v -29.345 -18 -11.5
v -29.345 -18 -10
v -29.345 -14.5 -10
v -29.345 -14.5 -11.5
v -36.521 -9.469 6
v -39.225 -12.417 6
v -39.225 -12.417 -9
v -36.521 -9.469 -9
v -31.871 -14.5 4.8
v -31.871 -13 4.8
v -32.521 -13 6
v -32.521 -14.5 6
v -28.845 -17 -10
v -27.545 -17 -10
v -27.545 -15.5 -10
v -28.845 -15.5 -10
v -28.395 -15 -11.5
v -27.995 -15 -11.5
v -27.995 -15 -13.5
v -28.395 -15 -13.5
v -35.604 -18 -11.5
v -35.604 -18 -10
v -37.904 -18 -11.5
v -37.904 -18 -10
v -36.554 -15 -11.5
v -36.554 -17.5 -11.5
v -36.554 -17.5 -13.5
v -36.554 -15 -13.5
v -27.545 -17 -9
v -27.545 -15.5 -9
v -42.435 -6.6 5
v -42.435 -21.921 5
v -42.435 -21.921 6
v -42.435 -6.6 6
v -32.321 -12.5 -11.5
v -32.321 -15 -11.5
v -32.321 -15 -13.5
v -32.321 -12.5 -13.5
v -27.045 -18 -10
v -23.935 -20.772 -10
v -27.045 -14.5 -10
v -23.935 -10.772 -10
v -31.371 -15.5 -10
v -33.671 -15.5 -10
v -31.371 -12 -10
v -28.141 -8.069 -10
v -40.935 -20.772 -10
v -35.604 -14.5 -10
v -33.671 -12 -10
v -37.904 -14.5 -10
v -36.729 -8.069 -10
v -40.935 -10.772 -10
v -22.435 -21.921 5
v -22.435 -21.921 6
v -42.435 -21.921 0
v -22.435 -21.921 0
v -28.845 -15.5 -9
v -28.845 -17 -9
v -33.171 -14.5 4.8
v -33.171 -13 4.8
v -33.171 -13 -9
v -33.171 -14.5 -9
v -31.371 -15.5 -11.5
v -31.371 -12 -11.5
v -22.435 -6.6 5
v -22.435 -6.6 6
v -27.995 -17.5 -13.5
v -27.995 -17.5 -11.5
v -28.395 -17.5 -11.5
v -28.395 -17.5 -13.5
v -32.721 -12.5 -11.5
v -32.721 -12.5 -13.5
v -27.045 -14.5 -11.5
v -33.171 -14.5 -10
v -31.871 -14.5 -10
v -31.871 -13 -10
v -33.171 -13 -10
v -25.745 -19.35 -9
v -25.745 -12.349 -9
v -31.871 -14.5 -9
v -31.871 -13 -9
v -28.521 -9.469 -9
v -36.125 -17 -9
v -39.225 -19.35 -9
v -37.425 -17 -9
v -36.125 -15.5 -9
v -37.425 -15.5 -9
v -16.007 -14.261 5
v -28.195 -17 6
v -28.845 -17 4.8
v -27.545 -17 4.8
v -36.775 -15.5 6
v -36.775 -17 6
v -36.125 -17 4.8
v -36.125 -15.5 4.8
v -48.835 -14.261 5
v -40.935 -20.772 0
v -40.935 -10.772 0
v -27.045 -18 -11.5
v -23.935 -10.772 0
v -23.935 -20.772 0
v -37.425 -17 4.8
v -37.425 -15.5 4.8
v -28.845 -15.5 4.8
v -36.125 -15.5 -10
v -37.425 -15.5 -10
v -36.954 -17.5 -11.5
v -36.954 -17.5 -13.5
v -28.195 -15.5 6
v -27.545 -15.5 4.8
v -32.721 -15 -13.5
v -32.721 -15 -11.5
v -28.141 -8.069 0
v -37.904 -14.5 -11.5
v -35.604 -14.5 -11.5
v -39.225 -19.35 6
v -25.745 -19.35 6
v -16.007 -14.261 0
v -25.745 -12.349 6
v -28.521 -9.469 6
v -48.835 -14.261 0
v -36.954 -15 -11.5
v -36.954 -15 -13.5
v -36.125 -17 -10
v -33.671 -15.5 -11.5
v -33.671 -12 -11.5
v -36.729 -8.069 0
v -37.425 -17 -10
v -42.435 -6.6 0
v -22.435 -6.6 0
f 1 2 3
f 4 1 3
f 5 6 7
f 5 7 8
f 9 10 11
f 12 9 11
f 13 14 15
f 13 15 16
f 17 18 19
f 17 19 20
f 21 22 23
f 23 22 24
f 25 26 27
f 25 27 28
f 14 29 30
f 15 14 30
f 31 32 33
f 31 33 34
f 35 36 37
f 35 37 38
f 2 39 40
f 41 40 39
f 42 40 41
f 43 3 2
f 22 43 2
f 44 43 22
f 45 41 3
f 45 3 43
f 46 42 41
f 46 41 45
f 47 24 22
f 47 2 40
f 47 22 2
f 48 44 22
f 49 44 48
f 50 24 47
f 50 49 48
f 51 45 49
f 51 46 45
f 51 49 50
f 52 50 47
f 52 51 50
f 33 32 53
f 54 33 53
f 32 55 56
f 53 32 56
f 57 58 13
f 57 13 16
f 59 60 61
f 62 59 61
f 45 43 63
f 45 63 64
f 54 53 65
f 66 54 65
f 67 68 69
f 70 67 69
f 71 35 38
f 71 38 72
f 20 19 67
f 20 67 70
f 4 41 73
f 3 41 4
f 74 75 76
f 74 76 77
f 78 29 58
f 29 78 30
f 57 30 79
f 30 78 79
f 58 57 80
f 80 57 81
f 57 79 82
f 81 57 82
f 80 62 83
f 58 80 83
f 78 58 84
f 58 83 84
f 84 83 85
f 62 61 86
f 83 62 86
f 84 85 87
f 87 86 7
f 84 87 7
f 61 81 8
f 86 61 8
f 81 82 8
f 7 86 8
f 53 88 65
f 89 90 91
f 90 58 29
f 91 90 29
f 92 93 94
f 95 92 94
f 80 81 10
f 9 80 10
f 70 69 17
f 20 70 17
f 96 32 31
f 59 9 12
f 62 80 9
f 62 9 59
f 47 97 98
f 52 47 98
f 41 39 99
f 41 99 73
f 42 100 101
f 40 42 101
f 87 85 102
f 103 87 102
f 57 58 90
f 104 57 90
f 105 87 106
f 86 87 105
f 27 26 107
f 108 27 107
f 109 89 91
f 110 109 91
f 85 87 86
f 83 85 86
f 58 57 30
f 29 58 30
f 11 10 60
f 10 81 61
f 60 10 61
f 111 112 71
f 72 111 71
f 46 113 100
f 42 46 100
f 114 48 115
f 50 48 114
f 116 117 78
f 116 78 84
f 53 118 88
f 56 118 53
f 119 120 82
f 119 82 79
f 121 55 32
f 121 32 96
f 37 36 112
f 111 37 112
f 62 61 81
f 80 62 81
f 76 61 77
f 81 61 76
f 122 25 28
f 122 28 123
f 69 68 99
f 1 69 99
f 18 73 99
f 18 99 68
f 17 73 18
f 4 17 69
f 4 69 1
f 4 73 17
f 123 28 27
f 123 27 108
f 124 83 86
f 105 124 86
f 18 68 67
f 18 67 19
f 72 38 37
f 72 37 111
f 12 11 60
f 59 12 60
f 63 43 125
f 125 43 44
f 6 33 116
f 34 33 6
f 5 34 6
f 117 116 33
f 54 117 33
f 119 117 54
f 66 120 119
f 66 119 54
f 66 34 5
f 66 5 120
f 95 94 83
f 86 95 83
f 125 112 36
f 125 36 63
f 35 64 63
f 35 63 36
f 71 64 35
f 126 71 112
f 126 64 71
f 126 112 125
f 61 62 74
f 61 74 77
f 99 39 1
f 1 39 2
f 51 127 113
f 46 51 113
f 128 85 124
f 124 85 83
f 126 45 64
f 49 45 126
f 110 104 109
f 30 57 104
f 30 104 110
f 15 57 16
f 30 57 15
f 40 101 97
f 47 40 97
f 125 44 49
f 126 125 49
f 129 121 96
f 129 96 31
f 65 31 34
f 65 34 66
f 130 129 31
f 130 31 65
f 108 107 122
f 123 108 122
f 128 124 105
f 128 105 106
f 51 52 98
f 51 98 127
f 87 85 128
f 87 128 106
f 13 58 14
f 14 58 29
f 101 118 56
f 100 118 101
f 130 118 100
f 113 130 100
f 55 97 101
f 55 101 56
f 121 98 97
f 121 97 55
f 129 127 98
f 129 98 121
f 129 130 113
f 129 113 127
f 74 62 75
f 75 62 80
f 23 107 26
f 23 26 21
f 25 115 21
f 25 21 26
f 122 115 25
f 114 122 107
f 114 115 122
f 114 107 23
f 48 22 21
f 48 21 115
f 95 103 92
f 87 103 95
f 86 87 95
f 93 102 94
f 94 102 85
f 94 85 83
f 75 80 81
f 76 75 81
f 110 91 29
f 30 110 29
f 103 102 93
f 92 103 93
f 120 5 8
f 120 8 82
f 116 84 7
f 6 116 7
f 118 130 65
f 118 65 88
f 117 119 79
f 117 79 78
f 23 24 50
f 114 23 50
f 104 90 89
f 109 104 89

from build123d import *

# Parameters (mm, degrees)
BOSS_EXTRUDE1_DEPTH  = 5
SKETCH16_W           = 20
SKETCH16_H           = 15.320888863
BOSS_EXTRUDE8_DEPTH  = 1
BOSS_EXTRUDE9_DEPTH  = 10
CUT_EXTRUDE5_DEPTH   = 15
BOSS_EXTRUDE10_DEPTH = 1.5
BOSS_EXTRUDE11_DEPTH = 1.5
CUT_EXTRUDE6_REACH   = 57.591
SKETCH22_W           = 1.3
SKETCH22_H           = 1.5
SKETCH23_W           = 2.3
SKETCH23_H           = 3.5
BOSS_EXTRUDE12_DEPTH = 1.5
SKETCH24_W           = 2.3
SKETCH24_H           = 3.5
BOSS_EXTRUDE13_DEPTH = 1.5
SKETCH25_W           = 0.4
SKETCH25_H           = 2.5
BOSS_EXTRUDE14_DEPTH = 2
SKETCH26_W           = 0.4
SKETCH26_H           = 2.5
BOSS_EXTRUDE15_DEPTH = 2


with BuildPart() as part:
    # Sketch1 → Boss-Extrude1 (new body)
    with BuildSketch(Plane.XY):
        Polygon((-22.434902357, -6.600395702), (-16.00702626, -14.260840133), (-22.434902357, -21.921284565), (-42.434902357, -21.921284565), (-48.834902357, -14.260840133), (-42.434902357, -6.600395702), align=None)
    extrude(amount=BOSS_EXTRUDE1_DEPTH)

    # Sketch16 → Boss-Extrude8 (add)
    with BuildSketch(Plane.XY.offset(5)):
        with Locations((-32.434902357, -14.260840134)):
            Rectangle(SKETCH16_W, SKETCH16_H)
    extrude(amount=BOSS_EXTRUDE8_DEPTH)

    # Sketch17 → Boss-Extrude9 (add)
    with BuildSketch(Plane(origin=(0, 0, 0), x_dir=(-1, 0, 0), z_dir=(0, 0, -1))):
        Polygon((23.934902357, -10.772270445), (23.934902357, -20.772270445), (40.934902357, -20.772270445), (40.934902357, -10.772270445), (36.728990204, -8.068513251), (28.140814509, -8.068513251), align=None)
    extrude(amount=BOSS_EXTRUDE9_DEPTH)

    # Sketch18 → Cut-Extrude5 (cut)
    with BuildSketch(Plane.XY.offset(6)):
        Polygon((-36.52114033, -9.469193937), (-28.52114033, -9.469193937), (-25.745192181, -12.349143915), (-25.745192181, -19.349565181), (-39.224780036, -19.349565181), (-39.224780036, -12.417130901), align=None)
    extrude(amount=-CUT_EXTRUDE5_DEPTH, mode=Mode.SUBTRACT)

    # Sketch19 → Boss-Extrude10 (add)
    with BuildSketch(Plane(origin=(0, -17, 0), x_dir=(1, 0, 0), z_dir=(0, 1, 0))):
        Polygon((-27.545192181, 9), (-28.845192181, 9), (-28.845192181, -4.8), (-28.195192181, -6), (-27.545192181, -4.8), align=None)
        Polygon((-36.124780036, 9), (-37.424780036, 9), (-37.424780036, -4.8), (-36.774780036, -6), (-36.124780036, -4.8), align=None)
    extrude(amount=BOSS_EXTRUDE10_DEPTH)

    # Sketch20 → Boss-Extrude11 (add)
    with BuildSketch(Plane(origin=(0, -13, 0), x_dir=(-1, 0, 0), z_dir=(0, -1, 0))):
        Polygon((33.17114033, 9), (31.87114033, 9), (31.87114033, -4.8), (32.52114033, -6), (33.17114033, -4.8), align=None)
    extrude(amount=BOSS_EXTRUDE11_DEPTH)

    # Sketch22 → Cut-Extrude6 (cut, up to next)
    with BuildSketch(Plane.XY.offset(-9), mode=Mode.PRIVATE) as cut_extrude6_sk1:
        with Locations((-28.195192181, -16.25)):
            Rectangle(SKETCH22_W, SKETCH22_H)
    cut_extrude6_tool1 = extrude(cut_extrude6_sk1.sketch, amount=-CUT_EXTRUDE6_REACH, mode=Mode.PRIVATE) & part.part
    # Sketch22 → Cut-Extrude6 (cut, up to next)
    with BuildSketch(Plane.XY.offset(-9), mode=Mode.PRIVATE) as cut_extrude6_sk2:
        with Locations((-32.52114033, -13.75)):
            Rectangle(SKETCH22_W, SKETCH22_H)
    cut_extrude6_tool2 = extrude(cut_extrude6_sk2.sketch, amount=-CUT_EXTRUDE6_REACH, mode=Mode.PRIVATE) & part.part
    # Sketch22 → Cut-Extrude6 (cut, up to next)
    with BuildSketch(Plane.XY.offset(-9), mode=Mode.PRIVATE) as cut_extrude6_sk3:
        with Locations((-36.774780036, -16.25)):
            Rectangle(SKETCH22_W, SKETCH22_H)
    cut_extrude6_tool3 = extrude(cut_extrude6_sk3.sketch, amount=-CUT_EXTRUDE6_REACH, mode=Mode.PRIVATE) & part.part
    add(cut_extrude6_tool1.solids().sort_by_distance((-28.195192, -16.25, -9))[0], mode=Mode.SUBTRACT)
    add(cut_extrude6_tool2.solids().sort_by_distance((-32.52114, -13.75, -9))[0], mode=Mode.SUBTRACT)
    add(cut_extrude6_tool3.solids().sort_by_distance((-36.77478, -16.25, -9))[0], mode=Mode.SUBTRACT)


with BuildPart() as cut_extrude6_piece_1:
    # of the separate pieces the step leaves, piece 1, a body of its own (cut_extrude6_pieces)
    add(part.part.solids().sort_by_distance((-22.434902357, -6.600395702, 0))[0])

    # Sketch23 → Boss-Extrude12 (add)
    with BuildSketch(Plane(origin=(0, 0, -10), x_dir=(-1, 0, 0), z_dir=(0, 0, -1))):
        with Locations((36.75436789, -16.25)):
            Rectangle(SKETCH23_W, SKETCH23_H)
        with Locations((28.195192181, -16.25)):
            Rectangle(SKETCH23_W, SKETCH23_H)
    extrude(amount=BOSS_EXTRUDE12_DEPTH)

    # Sketch24 → Boss-Extrude13 (add)
    with BuildSketch(Plane(origin=(0, 0, -10), x_dir=(-1, 0, 0), z_dir=(0, 0, -1))):
        with Locations((32.52114033, -13.75)):
            Rectangle(SKETCH24_W, SKETCH24_H)
    extrude(amount=BOSS_EXTRUDE13_DEPTH)

    # Sketch25 → Boss-Extrude14 (add)
    with BuildSketch(Plane(origin=(0, 0, -11.5), x_dir=(-1, 0, 0), z_dir=(0, 0, -1))):
        with Locations((32.52114033, -13.75)):
            Rectangle(SKETCH25_W, SKETCH25_H)
    extrude(amount=BOSS_EXTRUDE14_DEPTH)

    # Sketch26 → Boss-Extrude15 (add)
    with BuildSketch(Plane(origin=(0, 0, -11.5), x_dir=(-1, 0, 0), z_dir=(0, 0, -1))):
        with Locations((36.75436789, -16.25)):
            Rectangle(SKETCH26_W, SKETCH26_H)
        with Locations((28.195188324, -16.25)):
            Rectangle(SKETCH26_W, SKETCH26_H)
    extrude(amount=BOSS_EXTRUDE15_DEPTH)


with BuildPart() as cut_extrude6_piece_2:
    # of the separate pieces the step leaves, piece 2, a body of its own (cut_extrude6_pieces)
    add(part.part.solids().sort_by_distance((-37.424780036, -17, 4.8))[0])


with BuildPart() as cut_extrude6_piece_3:
    # of the separate pieces the step leaves, piece 3, a body of its own (cut_extrude6_pieces)
    add(part.part.solids().sort_by_distance((-31.87114033, -13, 4.8))[0])


with BuildPart() as cut_extrude6_piece_4:
    # of the separate pieces the step leaves, piece 4, a body of its own (cut_extrude6_pieces)
    add(part.part.solids().sort_by_distance((-28.845192181, -17, 4.8))[0])


solid = Compound([cut_extrude6_piece_1.part, cut_extrude6_piece_2.part, cut_extrude6_piece_3.part, cut_extrude6_piece_4.part])
